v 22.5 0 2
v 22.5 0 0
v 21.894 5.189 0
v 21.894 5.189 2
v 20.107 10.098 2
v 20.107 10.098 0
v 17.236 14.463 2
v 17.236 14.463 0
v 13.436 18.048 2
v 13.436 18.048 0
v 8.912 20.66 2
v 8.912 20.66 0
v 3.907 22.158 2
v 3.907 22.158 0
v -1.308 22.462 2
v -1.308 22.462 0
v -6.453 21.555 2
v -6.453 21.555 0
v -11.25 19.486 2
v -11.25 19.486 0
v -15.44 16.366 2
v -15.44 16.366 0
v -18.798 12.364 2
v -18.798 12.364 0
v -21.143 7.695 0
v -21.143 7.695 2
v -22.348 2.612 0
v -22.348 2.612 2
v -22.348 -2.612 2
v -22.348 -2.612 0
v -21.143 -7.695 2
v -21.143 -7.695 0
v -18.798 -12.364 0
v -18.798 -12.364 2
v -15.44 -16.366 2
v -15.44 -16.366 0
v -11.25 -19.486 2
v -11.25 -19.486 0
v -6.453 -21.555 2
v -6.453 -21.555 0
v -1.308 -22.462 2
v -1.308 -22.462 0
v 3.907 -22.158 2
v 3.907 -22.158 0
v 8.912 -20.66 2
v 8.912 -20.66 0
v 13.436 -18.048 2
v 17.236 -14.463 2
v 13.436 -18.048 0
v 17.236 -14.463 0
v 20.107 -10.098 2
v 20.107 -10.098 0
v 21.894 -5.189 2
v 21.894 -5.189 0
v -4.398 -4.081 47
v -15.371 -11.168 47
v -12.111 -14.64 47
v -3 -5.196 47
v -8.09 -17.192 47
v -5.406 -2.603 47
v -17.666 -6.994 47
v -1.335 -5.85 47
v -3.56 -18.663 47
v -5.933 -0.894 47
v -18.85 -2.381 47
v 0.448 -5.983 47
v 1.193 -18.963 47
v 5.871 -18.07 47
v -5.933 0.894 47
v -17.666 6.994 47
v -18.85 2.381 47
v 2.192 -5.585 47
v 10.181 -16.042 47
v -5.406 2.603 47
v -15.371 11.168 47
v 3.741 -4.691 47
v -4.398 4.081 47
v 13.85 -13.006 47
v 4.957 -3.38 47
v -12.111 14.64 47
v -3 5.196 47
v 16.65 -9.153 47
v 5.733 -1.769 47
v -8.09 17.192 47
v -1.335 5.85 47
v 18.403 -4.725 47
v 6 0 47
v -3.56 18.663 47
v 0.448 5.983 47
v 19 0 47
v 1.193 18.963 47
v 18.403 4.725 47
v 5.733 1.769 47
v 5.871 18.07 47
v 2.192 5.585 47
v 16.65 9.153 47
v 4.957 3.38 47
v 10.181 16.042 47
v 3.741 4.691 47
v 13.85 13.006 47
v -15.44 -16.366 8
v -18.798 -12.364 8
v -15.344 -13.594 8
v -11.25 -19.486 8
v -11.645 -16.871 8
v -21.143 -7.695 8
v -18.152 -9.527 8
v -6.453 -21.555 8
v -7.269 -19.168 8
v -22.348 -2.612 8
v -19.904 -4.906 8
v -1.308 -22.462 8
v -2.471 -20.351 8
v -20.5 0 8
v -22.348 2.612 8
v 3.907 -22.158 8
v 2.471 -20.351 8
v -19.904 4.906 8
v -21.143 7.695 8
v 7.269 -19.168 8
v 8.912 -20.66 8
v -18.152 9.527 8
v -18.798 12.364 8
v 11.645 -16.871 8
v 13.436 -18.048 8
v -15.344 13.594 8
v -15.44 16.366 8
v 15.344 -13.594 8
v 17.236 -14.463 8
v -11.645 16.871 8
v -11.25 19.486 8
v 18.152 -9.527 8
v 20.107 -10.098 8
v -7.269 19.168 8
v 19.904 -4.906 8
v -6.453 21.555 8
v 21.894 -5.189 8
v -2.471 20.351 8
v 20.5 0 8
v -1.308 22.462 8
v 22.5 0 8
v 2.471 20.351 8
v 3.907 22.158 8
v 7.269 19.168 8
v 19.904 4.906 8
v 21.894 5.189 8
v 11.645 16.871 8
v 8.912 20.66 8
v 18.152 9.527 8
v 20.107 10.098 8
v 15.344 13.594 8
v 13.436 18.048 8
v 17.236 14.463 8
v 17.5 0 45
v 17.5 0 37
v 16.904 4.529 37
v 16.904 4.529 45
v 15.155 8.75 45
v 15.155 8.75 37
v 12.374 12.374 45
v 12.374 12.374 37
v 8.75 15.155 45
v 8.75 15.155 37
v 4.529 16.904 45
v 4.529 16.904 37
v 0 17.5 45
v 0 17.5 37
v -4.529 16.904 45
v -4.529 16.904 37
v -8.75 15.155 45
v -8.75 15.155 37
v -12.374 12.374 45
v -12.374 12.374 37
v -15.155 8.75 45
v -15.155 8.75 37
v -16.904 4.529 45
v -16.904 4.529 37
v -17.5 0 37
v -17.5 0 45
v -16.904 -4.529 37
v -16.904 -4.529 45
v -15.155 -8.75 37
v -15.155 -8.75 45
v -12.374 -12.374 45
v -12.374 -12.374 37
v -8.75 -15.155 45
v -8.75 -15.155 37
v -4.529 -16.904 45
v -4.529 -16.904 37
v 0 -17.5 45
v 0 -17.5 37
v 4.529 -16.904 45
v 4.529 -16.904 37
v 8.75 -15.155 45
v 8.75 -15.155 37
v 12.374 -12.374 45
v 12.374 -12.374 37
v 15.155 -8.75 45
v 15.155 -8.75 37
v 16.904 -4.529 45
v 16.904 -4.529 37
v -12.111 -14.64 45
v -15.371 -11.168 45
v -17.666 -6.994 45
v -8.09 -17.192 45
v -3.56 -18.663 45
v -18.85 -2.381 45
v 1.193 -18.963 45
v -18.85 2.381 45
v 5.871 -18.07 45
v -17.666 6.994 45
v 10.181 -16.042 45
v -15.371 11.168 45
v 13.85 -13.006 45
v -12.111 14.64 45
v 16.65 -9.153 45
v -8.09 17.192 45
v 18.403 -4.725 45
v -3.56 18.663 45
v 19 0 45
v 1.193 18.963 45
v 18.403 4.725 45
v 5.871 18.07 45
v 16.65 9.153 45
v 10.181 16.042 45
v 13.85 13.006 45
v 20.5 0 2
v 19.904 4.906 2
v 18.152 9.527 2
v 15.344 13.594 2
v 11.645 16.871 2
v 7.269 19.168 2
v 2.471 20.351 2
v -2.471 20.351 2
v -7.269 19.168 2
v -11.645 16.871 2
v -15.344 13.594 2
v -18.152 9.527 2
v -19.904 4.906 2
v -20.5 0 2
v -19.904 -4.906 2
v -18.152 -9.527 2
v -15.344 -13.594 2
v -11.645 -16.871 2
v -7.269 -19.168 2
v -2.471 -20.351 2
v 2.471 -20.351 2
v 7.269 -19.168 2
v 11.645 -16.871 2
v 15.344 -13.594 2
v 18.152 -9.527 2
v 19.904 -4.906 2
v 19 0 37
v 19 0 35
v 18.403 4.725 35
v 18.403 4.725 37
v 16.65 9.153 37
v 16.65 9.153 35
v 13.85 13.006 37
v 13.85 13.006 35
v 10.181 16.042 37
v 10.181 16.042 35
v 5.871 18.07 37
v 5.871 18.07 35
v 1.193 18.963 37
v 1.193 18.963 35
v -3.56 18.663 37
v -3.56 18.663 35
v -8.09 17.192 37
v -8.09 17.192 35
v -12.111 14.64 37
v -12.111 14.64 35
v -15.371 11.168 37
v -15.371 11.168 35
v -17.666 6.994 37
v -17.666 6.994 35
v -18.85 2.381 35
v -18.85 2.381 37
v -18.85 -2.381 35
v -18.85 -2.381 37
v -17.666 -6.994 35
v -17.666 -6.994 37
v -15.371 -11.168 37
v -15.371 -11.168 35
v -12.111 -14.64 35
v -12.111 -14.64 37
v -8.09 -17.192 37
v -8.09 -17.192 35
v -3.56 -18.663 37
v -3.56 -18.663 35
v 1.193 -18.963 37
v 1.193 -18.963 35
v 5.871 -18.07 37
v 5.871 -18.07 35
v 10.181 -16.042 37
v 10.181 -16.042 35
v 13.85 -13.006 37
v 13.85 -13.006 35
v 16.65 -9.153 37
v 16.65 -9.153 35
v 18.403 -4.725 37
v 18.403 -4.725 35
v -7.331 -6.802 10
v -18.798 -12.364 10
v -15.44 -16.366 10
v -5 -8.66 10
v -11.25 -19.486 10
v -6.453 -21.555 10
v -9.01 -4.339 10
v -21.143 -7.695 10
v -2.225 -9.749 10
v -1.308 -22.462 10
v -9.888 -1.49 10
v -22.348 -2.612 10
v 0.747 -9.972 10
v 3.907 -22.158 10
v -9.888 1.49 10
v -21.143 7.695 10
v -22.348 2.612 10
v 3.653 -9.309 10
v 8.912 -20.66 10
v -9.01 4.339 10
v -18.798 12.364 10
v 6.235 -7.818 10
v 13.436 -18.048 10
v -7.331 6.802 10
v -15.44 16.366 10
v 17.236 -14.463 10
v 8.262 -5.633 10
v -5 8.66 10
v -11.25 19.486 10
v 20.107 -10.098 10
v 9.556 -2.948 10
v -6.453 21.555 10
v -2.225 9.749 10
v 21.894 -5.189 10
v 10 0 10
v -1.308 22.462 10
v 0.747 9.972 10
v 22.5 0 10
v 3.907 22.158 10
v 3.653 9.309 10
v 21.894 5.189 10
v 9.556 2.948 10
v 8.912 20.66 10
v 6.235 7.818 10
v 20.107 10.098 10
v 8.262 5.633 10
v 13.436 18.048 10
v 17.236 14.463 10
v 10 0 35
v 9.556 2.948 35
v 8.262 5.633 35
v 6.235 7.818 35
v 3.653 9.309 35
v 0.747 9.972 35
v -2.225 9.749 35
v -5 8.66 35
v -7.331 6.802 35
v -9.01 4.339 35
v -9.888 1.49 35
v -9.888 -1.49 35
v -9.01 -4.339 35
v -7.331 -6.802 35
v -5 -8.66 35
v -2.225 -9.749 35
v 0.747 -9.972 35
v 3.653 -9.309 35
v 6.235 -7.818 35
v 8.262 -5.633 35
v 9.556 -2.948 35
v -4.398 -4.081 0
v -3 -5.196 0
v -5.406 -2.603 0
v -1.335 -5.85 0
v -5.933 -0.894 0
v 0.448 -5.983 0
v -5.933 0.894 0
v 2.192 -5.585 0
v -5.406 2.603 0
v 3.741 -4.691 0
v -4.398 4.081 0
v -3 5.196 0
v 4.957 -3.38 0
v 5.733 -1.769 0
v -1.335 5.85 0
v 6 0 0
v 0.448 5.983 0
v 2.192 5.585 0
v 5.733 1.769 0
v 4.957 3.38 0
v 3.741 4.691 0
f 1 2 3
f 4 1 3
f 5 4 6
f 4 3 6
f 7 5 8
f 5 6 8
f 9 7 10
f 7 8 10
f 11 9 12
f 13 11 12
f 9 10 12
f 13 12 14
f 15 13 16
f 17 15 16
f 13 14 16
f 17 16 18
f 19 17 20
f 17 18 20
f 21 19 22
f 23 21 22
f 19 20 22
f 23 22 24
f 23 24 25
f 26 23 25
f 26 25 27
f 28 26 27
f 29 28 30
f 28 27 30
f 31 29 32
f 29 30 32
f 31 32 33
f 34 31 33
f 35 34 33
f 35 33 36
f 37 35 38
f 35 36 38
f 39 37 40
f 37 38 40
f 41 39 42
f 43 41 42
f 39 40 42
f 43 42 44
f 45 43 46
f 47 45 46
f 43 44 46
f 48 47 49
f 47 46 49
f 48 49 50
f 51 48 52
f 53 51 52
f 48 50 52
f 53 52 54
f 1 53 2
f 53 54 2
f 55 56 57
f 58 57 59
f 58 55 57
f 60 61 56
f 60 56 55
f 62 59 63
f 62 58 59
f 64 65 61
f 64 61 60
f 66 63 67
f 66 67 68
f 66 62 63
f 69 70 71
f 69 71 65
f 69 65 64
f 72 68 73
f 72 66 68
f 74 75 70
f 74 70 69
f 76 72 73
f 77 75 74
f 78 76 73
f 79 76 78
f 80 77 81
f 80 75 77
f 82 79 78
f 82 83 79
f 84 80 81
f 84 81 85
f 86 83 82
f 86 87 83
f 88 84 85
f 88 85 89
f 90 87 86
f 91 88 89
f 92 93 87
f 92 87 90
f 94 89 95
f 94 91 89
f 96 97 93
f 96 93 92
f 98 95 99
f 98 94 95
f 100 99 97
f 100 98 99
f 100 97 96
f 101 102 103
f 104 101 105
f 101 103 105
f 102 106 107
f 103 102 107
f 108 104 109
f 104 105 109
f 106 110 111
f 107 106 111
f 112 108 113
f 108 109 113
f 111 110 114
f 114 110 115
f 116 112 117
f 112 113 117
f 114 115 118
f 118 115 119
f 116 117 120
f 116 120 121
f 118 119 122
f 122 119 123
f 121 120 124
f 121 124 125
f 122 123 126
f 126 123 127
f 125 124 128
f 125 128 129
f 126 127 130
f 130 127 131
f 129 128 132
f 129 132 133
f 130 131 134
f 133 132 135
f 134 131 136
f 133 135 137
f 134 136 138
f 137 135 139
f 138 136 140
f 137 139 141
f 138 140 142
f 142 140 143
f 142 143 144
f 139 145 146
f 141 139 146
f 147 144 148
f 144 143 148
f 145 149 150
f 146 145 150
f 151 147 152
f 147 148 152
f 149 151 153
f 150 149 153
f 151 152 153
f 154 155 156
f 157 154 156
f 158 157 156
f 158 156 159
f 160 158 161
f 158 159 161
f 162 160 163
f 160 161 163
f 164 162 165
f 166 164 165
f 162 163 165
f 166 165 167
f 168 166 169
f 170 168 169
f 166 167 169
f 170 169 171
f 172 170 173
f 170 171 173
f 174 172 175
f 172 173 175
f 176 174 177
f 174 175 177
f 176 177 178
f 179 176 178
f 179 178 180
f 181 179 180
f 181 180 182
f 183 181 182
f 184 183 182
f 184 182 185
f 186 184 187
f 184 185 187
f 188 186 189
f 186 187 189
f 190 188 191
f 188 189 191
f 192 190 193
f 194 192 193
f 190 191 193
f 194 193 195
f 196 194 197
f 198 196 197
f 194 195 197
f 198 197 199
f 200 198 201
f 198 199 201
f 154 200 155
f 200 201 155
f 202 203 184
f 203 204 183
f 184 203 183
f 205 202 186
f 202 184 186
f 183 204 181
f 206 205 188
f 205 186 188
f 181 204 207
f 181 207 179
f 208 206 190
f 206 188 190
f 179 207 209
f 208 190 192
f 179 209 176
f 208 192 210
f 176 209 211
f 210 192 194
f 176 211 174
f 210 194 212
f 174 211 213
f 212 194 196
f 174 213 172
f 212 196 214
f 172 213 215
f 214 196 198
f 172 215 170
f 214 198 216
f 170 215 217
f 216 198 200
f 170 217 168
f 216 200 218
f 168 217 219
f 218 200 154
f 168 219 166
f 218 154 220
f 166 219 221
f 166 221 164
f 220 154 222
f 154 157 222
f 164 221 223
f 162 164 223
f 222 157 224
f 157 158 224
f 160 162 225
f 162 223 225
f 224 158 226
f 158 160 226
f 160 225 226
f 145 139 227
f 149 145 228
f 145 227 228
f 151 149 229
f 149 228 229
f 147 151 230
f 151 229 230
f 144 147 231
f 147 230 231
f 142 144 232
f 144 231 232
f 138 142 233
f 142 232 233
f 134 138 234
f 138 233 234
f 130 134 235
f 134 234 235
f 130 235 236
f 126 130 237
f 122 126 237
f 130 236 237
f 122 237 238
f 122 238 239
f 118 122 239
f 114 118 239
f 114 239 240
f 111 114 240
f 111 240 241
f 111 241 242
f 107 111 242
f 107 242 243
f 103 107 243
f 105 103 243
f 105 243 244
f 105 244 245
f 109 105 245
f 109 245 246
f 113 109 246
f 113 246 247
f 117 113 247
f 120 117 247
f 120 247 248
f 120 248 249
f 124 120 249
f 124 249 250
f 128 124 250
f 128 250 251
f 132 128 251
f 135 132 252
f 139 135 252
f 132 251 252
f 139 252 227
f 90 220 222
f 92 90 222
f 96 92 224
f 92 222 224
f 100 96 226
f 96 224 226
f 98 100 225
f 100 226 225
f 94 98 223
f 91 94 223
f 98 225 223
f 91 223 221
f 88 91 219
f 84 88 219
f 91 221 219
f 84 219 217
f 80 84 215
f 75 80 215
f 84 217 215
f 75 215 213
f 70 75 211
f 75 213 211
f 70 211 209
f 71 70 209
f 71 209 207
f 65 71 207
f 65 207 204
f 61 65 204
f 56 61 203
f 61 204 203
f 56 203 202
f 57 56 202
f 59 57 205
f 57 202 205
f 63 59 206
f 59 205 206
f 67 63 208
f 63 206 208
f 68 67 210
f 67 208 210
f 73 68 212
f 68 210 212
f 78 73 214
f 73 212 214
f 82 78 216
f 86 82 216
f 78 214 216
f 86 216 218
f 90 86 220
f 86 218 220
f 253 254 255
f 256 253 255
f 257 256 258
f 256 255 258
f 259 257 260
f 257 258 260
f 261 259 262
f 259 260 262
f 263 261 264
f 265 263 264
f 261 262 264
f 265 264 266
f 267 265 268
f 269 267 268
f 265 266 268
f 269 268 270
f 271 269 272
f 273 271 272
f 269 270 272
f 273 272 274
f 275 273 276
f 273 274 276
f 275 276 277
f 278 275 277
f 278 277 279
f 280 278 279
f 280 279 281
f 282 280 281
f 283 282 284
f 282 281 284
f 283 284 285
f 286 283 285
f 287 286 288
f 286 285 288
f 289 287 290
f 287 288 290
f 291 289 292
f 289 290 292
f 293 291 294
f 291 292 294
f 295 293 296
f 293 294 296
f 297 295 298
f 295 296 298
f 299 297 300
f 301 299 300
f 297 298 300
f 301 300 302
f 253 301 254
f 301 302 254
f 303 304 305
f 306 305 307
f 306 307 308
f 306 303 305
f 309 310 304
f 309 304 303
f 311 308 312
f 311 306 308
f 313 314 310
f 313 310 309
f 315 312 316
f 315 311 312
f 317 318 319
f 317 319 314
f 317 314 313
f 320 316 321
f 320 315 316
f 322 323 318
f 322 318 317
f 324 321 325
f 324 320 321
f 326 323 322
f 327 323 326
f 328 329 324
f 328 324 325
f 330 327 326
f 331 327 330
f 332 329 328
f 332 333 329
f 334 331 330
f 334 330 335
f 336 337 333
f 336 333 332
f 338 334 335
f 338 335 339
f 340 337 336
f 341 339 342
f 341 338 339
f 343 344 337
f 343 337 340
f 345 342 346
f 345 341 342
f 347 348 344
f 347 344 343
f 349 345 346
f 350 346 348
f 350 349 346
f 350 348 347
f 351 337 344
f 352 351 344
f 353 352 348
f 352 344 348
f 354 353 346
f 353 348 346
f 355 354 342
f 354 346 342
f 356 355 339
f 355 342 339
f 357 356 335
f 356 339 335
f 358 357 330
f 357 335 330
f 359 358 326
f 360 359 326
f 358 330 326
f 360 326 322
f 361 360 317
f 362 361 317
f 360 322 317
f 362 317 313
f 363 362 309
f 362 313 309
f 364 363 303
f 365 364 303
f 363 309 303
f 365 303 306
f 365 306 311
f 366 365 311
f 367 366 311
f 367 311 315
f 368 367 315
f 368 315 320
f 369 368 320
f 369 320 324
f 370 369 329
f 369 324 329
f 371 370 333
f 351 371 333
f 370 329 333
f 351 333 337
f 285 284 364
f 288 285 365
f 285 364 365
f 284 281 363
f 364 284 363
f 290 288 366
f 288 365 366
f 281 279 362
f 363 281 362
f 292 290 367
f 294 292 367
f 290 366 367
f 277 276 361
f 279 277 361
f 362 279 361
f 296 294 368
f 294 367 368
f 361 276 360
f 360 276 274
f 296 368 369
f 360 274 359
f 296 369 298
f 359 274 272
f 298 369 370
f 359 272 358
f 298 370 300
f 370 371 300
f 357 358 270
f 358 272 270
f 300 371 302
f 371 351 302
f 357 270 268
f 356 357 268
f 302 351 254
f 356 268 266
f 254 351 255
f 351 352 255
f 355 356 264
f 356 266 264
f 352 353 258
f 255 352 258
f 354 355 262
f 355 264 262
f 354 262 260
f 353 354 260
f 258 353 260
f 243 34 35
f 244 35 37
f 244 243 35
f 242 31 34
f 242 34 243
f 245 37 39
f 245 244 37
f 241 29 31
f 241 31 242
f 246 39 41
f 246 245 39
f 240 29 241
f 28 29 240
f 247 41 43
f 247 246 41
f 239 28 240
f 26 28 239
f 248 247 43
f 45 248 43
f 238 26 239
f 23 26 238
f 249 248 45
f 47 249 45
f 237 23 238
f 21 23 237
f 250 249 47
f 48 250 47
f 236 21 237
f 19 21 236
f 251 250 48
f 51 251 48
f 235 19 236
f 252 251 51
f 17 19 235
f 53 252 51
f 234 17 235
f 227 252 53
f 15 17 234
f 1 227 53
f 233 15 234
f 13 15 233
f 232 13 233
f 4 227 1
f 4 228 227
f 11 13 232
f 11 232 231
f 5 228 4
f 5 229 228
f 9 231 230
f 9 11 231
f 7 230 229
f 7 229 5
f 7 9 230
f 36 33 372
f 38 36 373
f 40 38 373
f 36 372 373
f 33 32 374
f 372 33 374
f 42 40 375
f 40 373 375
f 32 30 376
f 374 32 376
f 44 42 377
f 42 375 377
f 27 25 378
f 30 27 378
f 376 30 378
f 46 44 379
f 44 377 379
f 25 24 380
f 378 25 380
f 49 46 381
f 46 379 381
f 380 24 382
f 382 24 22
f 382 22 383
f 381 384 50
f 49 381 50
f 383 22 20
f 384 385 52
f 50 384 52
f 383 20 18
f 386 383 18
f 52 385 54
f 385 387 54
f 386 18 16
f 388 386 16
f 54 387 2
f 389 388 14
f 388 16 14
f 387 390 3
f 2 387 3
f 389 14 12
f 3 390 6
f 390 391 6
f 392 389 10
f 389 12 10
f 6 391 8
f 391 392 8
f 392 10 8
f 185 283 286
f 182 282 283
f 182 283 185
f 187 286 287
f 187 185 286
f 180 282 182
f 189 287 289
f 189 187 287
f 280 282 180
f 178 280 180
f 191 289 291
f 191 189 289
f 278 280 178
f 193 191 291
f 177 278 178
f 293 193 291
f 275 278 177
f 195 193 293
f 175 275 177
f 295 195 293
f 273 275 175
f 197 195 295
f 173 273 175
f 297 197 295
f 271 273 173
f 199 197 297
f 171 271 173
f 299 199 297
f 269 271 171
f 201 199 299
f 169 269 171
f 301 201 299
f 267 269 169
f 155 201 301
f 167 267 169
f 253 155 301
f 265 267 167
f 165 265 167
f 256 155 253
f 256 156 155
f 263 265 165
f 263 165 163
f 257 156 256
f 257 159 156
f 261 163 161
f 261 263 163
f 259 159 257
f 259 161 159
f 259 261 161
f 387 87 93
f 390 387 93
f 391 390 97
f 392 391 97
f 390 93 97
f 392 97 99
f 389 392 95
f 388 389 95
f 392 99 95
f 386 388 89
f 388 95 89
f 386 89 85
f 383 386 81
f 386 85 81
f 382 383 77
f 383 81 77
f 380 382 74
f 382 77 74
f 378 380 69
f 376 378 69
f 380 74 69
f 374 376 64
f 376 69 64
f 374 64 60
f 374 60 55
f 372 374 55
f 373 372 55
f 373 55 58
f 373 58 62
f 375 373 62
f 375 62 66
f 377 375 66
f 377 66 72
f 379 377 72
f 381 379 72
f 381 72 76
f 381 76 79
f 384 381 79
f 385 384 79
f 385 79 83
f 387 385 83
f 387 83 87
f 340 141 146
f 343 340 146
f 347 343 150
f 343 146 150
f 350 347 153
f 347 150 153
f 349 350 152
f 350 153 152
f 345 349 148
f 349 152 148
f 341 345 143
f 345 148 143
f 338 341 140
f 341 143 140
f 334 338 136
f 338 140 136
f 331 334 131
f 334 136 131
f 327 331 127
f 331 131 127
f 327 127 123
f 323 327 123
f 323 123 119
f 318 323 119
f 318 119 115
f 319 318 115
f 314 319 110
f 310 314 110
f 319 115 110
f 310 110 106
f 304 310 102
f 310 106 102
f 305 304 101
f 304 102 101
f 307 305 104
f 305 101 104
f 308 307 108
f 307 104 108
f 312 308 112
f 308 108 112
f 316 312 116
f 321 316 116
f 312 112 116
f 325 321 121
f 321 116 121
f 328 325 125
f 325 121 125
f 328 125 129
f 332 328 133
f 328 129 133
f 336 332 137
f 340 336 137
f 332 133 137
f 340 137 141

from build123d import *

# Parameters (mm, degrees)
SKIZZE1_R                        = 22.5
SEITE1_DEPTH                     = 2
SKIZZE2_R                        = 20.5
LAUFFL_CHE_DEPTH                 = 8
SKIZZE5_R                        = 22.5
SEITE_2_DEPTH                    = 2
BOHRUNG_DEPTH                    = 100
BOHRUNG_DEPTH_BACK               = 34.35416016
SKIZZE7_R                        = 2.5
SKIZZE9_R                        = 10
ZAPFEN_DEPTH                     = 25
SKIZZE10_R                       = 19
SEITENTEIL3_DEPTH                = 2
SKIZZE12_R                       = 17.5
ZAHNFL_CHE_DEPTH                 = 8
SKIZZE13_R                       = 19
SEITENTEIL4_DEPTH                = 2
F_12_0_12_DURCHMESSER_BOHRUNG1_D = 12


with BuildPart() as part:
    # Skizze1 → Seite1 (new body)
    with BuildSketch(Plane.XY):
        Circle(SKIZZE1_R)
    extrude(amount=SEITE1_DEPTH)

    # Skizze2 → Lauffläche (add)
    with BuildSketch(Plane.XY):
        Circle(SKIZZE2_R)
    extrude(amount=LAUFFL_CHE_DEPTH)

    # Skizze5 → Seite 2 (add)
    with BuildSketch(Plane.XY.offset(8)):
        Circle(SKIZZE5_R)
    extrude(amount=SEITE_2_DEPTH)

    # Skizze7 → Bohrung (cut, two sides: drawn at the far end of the back side and taken through both)
    with BuildSketch(Plane.XY.offset(-BOHRUNG_DEPTH_BACK)):
        Circle(SKIZZE7_R)
    extrude(amount=BOHRUNG_DEPTH + BOHRUNG_DEPTH_BACK, mode=Mode.SUBTRACT)

    # Skizze9 → Zapfen (add)
    with BuildSketch(Plane.XY.offset(10)):
        Circle(SKIZZE9_R)
    extrude(amount=ZAPFEN_DEPTH)

    # Skizze10 → Seitenteil3 (add)
    with BuildSketch(Plane.XY.offset(35)):
        Circle(SKIZZE10_R)
    extrude(amount=SEITENTEIL3_DEPTH)

    # Skizze12 → Zahnfläche (add)
    with BuildSketch(Plane.XY.offset(37)):
        Circle(SKIZZE12_R)
    extrude(amount=ZAHNFL_CHE_DEPTH)

    # Skizze13 → Seitenteil4 (add)
    with BuildSketch(Plane.XY.offset(45)):
        Circle(SKIZZE13_R)
    extrude(amount=SEITENTEIL4_DEPTH)

    # Ø12.0 (12) Durchmesser Bohrung1 (through all)
    with Locations(Plane(origin=(0, 0, 0), x_dir=(-1, 0, 0), z_dir=(0, 0, -1))):
        with Locations((0, 0)):
            Hole(F_12_0_12_DURCHMESSER_BOHRUNG1_D / 2)


solid = part.part
